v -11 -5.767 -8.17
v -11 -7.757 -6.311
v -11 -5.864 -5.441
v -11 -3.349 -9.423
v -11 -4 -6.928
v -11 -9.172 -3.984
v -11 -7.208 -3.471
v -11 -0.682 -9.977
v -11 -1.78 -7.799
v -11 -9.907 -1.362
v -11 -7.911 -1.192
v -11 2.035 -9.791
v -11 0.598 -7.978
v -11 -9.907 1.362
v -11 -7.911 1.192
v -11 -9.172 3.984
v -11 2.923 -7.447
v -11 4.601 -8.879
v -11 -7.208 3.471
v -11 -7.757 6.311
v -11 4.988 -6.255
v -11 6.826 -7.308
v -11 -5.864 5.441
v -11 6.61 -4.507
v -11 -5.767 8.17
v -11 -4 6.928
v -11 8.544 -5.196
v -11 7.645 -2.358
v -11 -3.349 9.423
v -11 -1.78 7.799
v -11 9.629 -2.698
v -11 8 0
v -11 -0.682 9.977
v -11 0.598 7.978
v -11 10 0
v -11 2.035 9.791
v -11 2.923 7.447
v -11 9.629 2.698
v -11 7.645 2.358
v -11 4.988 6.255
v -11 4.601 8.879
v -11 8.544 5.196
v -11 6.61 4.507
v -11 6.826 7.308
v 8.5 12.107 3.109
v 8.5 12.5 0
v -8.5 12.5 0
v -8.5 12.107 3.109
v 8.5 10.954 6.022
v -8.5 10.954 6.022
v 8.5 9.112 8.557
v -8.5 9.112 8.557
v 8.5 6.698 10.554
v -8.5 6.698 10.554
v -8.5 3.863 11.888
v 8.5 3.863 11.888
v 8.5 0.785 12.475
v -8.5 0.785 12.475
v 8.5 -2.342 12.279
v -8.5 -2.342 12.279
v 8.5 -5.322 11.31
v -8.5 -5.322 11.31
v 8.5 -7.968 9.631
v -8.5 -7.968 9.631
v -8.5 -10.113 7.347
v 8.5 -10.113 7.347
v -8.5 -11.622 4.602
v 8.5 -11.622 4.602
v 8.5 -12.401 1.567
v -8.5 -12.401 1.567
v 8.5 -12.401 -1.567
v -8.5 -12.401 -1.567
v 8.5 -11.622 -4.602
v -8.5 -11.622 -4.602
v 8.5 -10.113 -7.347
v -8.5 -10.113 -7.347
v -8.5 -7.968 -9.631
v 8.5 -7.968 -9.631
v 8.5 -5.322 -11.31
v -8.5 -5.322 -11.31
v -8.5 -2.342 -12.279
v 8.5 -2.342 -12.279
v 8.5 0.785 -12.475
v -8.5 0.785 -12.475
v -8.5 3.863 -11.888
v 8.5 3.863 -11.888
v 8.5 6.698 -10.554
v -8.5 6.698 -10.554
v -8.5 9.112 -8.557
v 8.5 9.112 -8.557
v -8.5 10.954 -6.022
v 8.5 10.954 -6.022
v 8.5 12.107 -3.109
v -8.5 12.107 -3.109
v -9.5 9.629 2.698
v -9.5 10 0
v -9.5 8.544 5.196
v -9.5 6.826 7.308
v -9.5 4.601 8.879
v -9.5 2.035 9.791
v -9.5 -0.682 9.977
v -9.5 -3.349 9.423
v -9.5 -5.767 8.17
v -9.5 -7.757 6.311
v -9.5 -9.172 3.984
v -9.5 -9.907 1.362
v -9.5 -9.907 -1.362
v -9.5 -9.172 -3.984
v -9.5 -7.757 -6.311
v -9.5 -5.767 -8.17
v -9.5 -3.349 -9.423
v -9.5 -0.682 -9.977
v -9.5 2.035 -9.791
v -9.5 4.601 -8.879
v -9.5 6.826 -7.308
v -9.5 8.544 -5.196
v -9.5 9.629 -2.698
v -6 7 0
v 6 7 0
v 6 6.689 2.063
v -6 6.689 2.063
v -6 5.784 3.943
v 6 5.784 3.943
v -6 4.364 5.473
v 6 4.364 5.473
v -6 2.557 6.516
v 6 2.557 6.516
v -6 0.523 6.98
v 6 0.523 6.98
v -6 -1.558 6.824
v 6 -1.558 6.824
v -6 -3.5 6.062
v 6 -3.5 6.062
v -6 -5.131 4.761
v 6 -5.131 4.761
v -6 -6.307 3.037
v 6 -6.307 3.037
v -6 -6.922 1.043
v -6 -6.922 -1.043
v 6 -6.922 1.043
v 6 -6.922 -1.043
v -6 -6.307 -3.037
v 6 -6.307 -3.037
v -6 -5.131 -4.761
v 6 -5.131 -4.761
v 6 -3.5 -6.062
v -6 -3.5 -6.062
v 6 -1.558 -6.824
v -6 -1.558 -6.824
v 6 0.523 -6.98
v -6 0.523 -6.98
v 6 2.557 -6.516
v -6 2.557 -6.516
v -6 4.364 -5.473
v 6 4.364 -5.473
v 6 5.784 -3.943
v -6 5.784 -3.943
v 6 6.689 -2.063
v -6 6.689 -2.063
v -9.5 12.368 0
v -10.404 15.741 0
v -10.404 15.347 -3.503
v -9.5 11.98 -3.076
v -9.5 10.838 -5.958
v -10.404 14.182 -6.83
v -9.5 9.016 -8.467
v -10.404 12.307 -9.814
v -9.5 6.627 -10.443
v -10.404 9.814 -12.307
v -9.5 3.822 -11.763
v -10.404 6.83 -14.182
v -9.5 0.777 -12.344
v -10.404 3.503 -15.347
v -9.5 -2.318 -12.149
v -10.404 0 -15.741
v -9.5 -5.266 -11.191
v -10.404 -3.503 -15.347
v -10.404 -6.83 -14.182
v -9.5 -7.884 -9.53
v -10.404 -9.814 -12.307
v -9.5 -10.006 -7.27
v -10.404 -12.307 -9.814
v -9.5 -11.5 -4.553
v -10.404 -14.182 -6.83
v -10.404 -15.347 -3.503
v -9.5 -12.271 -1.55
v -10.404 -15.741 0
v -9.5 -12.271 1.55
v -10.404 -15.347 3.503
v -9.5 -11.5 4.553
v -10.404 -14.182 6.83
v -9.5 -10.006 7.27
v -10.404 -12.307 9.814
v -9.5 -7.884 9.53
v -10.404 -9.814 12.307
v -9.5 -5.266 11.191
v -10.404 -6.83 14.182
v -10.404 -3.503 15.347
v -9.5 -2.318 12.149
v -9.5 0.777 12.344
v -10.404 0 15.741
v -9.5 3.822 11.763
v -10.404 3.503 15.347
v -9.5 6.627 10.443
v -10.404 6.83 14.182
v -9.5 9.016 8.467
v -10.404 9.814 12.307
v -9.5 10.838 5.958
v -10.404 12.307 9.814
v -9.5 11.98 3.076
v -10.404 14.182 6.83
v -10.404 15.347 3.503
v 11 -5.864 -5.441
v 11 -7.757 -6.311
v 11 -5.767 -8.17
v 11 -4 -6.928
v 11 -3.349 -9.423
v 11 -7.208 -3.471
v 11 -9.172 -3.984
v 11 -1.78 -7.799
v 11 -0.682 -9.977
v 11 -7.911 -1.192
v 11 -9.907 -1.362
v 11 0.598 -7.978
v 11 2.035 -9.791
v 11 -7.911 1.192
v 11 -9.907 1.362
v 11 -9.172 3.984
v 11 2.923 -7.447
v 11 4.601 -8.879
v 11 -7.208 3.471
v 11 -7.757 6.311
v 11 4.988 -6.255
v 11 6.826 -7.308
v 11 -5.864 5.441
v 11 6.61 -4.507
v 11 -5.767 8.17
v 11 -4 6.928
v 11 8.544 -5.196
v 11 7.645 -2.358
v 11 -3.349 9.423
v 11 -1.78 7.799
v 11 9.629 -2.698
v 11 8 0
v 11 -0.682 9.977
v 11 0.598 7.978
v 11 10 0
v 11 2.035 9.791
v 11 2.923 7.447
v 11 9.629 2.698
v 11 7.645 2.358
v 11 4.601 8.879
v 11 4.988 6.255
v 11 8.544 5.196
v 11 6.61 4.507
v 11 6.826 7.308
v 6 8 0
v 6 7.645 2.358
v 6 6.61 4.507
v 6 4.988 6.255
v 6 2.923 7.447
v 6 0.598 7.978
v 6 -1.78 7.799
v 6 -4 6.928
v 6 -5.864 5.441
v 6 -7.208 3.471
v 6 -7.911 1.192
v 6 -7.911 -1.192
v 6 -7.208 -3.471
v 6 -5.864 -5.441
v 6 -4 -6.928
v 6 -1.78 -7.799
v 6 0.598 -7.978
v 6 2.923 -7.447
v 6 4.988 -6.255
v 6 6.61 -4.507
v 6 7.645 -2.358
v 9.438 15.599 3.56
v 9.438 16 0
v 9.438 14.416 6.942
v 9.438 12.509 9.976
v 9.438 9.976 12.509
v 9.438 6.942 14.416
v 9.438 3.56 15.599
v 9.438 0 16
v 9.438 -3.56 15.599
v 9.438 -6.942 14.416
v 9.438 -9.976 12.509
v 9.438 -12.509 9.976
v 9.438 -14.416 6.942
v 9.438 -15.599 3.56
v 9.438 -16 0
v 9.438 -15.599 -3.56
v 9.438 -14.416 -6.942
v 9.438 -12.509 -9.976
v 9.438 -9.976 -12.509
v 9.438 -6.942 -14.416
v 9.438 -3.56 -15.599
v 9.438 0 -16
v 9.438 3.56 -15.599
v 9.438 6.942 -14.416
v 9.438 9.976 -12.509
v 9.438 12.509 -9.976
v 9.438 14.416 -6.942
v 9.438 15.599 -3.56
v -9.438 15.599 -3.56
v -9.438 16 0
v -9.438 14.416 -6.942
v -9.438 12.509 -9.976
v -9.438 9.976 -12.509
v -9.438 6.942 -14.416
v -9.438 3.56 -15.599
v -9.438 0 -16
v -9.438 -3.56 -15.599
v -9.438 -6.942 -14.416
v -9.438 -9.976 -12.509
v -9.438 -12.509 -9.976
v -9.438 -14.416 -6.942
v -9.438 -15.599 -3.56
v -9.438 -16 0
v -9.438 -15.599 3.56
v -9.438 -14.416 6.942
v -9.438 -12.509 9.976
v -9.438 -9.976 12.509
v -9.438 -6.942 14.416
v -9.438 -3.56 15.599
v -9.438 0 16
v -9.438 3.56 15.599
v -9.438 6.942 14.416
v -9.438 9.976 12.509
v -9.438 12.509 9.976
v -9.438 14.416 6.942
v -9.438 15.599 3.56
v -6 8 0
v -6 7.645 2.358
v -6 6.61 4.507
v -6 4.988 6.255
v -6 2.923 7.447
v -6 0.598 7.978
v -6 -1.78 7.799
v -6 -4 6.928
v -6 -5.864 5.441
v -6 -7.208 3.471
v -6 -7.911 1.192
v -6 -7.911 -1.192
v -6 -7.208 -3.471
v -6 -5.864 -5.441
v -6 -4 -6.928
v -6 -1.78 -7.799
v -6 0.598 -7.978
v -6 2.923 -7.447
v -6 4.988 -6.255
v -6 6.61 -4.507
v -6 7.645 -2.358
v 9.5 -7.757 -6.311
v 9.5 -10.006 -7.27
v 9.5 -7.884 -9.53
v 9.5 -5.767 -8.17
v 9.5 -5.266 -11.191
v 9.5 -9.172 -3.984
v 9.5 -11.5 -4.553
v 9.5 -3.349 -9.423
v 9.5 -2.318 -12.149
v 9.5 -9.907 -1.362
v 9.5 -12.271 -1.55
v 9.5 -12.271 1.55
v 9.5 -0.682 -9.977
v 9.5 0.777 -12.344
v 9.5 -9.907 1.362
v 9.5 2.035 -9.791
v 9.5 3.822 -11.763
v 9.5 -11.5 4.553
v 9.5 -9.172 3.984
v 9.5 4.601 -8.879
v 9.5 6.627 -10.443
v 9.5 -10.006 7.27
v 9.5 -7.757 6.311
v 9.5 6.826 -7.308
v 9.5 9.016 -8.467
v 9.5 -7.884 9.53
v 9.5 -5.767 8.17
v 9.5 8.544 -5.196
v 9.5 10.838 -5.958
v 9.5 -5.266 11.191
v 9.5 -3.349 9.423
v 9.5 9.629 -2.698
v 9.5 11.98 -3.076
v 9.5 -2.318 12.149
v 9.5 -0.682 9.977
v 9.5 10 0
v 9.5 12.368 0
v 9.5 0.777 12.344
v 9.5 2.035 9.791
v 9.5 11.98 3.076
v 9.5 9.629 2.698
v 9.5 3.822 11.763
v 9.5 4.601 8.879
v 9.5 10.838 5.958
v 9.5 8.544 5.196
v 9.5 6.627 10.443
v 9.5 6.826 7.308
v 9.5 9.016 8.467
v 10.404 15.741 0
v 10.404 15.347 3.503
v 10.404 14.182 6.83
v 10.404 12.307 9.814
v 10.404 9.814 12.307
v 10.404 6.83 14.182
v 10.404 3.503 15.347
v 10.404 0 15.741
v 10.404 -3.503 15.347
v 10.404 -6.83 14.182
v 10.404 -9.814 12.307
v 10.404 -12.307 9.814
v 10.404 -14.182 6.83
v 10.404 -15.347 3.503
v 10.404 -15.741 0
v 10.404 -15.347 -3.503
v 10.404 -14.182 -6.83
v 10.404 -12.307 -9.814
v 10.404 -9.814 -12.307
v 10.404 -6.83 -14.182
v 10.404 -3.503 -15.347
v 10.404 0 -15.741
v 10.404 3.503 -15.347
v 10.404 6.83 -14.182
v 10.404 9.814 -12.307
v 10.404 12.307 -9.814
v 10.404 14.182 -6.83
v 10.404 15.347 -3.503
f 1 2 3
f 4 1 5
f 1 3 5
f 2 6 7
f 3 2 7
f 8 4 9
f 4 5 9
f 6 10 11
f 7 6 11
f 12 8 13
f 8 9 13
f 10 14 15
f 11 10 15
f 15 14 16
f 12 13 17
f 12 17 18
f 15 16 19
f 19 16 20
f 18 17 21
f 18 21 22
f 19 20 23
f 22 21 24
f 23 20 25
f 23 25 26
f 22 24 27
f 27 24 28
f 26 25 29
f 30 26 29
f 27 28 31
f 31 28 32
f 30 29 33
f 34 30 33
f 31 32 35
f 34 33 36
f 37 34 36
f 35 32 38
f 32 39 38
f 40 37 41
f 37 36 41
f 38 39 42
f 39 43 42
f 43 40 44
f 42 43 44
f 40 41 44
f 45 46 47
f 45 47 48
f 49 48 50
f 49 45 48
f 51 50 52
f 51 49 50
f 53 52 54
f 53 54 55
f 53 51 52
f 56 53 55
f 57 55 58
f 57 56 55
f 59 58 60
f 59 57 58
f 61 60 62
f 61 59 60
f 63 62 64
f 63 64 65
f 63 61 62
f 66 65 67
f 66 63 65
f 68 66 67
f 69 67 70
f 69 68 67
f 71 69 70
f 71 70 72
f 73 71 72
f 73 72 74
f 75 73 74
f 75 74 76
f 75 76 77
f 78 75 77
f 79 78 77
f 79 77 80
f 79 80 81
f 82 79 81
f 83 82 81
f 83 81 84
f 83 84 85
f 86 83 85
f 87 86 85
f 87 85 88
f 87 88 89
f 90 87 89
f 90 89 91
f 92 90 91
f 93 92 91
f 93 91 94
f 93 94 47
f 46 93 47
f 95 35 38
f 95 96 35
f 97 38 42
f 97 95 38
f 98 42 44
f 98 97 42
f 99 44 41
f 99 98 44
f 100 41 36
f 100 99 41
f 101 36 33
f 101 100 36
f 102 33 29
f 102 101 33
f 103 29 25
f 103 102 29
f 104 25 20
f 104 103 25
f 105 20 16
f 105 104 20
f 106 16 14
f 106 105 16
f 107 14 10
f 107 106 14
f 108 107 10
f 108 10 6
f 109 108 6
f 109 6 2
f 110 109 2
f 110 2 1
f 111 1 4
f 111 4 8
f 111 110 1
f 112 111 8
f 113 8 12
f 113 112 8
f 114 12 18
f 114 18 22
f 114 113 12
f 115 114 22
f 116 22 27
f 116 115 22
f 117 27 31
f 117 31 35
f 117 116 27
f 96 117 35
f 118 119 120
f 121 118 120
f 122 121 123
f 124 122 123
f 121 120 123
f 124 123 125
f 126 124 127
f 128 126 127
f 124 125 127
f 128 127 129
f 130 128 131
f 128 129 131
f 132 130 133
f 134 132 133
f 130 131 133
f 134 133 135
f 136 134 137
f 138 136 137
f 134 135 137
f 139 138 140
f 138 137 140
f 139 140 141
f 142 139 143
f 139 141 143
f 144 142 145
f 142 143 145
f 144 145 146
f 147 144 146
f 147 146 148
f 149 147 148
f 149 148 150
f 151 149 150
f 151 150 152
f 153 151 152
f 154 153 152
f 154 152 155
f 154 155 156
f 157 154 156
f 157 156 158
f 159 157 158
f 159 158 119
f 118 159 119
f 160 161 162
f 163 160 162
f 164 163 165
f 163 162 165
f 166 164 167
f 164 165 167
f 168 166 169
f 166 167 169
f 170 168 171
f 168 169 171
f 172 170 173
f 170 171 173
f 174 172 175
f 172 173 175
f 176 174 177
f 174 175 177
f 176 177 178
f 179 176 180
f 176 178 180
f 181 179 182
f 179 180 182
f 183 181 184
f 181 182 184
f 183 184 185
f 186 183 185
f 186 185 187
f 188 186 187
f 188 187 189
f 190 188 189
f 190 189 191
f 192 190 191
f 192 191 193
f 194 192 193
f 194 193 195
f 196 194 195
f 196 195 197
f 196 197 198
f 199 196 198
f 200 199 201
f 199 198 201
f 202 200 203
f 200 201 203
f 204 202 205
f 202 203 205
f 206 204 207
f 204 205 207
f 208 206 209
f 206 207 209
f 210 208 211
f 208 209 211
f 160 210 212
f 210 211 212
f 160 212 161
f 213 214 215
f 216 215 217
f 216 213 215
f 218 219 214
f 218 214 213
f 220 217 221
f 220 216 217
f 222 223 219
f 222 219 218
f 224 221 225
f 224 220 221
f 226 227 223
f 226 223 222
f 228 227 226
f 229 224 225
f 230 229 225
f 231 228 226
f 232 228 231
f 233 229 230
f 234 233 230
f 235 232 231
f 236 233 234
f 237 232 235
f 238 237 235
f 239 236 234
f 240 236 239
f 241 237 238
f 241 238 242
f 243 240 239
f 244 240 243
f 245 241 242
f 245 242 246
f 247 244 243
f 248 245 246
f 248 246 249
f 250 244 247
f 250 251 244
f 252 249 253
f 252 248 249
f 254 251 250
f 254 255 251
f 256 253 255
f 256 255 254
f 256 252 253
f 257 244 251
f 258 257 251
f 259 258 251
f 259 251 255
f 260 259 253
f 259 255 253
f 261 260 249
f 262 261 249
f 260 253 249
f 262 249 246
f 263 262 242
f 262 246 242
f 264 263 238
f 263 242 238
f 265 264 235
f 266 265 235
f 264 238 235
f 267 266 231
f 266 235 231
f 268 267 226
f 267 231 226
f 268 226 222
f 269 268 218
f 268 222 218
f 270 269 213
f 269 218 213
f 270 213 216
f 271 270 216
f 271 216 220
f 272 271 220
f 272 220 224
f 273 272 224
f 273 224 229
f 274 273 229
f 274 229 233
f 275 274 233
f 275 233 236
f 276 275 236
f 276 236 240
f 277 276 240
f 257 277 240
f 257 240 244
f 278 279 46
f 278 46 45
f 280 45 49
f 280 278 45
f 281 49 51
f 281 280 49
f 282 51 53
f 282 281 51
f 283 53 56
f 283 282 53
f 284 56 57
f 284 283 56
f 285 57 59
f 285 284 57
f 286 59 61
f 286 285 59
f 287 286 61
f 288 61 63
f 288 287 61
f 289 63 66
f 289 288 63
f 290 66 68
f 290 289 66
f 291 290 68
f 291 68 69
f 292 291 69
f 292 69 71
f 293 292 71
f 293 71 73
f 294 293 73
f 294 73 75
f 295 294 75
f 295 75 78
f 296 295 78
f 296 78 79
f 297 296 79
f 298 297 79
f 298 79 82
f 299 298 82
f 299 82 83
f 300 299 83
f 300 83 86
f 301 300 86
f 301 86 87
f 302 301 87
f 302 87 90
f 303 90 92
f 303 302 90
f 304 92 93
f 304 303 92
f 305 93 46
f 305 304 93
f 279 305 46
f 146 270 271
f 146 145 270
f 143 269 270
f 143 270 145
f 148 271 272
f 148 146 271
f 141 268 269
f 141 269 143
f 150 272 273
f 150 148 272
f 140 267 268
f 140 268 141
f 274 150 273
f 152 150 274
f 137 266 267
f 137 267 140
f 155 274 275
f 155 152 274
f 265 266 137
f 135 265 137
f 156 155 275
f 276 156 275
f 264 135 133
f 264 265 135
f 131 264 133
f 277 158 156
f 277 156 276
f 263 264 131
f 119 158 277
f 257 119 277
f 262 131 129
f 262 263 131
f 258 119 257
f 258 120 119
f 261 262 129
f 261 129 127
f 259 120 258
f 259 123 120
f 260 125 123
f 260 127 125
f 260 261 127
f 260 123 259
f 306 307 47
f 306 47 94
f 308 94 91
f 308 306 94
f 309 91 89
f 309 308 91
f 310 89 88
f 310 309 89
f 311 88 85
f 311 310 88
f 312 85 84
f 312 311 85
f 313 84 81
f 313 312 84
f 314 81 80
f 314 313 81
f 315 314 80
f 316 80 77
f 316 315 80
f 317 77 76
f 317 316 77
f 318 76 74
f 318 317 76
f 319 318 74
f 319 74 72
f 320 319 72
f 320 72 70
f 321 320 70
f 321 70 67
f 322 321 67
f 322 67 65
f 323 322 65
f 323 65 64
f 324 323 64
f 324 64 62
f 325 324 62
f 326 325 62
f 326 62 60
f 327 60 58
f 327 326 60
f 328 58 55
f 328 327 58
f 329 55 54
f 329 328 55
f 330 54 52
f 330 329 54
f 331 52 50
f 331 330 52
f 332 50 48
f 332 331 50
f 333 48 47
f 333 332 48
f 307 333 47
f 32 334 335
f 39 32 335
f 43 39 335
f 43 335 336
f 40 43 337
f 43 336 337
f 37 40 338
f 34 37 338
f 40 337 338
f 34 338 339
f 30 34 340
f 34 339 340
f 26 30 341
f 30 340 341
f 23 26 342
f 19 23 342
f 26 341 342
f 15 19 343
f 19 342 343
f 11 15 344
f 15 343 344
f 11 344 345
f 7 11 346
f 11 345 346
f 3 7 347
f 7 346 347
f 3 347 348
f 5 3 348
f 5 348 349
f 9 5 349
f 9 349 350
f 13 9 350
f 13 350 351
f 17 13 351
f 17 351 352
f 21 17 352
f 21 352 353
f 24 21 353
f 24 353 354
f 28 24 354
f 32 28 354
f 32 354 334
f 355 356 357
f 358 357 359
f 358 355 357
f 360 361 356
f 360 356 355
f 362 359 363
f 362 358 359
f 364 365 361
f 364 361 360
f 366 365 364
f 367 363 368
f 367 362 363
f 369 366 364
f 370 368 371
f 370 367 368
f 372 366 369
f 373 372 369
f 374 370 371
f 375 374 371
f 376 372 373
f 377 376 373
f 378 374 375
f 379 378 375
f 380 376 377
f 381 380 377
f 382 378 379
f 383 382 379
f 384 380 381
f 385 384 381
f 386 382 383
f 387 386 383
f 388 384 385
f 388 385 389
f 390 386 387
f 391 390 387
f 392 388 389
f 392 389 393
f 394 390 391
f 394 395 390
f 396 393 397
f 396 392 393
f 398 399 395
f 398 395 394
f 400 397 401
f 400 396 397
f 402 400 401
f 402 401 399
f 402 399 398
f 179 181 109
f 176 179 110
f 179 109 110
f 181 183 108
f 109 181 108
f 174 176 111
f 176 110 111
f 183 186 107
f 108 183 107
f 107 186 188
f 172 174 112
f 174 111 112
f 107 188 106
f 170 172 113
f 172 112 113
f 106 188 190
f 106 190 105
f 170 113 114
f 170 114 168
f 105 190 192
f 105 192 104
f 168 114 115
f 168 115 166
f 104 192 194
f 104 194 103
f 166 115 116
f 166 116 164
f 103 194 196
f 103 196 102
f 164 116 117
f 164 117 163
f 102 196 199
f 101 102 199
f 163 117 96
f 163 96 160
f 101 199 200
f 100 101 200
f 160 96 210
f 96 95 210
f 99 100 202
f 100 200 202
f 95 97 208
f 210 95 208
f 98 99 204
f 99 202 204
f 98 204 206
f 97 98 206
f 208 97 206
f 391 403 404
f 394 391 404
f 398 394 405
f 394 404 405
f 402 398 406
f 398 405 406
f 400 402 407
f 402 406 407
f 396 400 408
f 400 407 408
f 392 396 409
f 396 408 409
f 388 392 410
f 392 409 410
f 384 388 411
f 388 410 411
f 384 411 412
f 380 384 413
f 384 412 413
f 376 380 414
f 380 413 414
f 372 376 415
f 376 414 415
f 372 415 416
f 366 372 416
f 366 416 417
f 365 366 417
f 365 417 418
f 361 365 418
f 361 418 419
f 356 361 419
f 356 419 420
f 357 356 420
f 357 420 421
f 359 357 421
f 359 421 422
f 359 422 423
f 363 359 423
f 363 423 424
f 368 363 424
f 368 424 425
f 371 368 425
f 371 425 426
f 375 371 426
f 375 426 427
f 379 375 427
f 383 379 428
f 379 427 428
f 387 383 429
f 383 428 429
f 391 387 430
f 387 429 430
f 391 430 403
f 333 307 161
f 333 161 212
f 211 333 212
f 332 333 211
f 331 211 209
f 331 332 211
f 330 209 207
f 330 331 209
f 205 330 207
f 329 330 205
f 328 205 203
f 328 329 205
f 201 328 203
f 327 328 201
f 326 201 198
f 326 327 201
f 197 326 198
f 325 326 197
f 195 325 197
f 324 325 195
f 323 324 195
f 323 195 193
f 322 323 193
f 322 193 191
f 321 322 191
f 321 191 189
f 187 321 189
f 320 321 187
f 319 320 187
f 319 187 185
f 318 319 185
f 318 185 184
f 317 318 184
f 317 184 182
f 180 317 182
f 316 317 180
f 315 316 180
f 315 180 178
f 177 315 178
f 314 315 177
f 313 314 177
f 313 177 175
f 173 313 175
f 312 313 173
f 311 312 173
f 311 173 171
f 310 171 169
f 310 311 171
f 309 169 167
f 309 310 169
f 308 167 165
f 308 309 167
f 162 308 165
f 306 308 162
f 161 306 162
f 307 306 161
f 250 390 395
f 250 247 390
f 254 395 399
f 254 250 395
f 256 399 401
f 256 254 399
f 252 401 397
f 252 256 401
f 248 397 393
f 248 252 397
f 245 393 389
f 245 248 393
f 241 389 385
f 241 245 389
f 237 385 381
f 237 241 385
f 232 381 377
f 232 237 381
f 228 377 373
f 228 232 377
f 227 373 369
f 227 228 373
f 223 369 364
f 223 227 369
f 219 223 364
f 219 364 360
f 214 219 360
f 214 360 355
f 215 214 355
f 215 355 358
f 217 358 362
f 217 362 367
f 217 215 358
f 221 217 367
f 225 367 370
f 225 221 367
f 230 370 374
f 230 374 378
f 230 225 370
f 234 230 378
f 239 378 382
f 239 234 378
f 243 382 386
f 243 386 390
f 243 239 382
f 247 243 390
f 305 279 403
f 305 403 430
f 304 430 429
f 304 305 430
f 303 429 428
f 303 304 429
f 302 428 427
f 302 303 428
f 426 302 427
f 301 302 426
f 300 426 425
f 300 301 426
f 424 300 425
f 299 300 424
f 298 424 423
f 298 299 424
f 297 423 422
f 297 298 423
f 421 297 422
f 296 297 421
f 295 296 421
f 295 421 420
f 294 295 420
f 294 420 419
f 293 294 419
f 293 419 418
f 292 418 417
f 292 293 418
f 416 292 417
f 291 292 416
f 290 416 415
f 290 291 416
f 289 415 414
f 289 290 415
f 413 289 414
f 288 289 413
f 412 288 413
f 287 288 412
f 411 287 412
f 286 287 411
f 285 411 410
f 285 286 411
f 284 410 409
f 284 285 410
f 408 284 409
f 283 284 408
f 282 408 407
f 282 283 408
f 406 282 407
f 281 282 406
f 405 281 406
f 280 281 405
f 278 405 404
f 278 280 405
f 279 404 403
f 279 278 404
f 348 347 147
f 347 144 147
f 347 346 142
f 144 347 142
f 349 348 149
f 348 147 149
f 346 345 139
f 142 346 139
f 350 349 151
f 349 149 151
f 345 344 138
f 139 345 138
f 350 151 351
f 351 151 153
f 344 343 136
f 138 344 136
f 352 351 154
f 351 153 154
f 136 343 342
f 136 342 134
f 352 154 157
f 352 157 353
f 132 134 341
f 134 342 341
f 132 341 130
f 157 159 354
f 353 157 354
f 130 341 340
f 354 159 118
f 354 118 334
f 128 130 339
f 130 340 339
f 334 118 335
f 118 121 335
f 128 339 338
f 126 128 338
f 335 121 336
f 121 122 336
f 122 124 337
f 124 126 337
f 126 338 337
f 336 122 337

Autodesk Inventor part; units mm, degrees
sketch "_____2" plane through (0, 0, 0) normal (0, 0, 1) x (1, 0, 0)
  line L0 (11, 0) -> (-11, 0)
  line L1 (-11, 0) -> (-11, 10)
  line L2 (-11, 10) -> (-9.5, 10)
  line L3 (-9.5, 10) -> (-9.5, 12.3683)
  line L4 (-9.5, 12.3683) -> (-10.4037, 15.7412)
  line L5 (-10.4037, 15.7412) -> (-9.4378, 16)
  line L6 (-9.4378, 16) -> (-8.5, 12.5)
  line L7 (-8.5, 12.5) -> (8.5, 12.5)
  line L8 (8.5, 12.5) -> (9.4378, 16)
  line L9 (9.4378, 16) -> (10.4037, 15.7412)
  line L10 (10.4037, 15.7412) -> (9.5, 12.3683)
  line L11 (9.5, 12.3683) -> (9.5, 10)
  line L12 (9.5, 10) -> (11, 10)
  line L13 (11, 10) -> (11, 0)
  line L14 (11, 0) -> (-11, 0)
revolve "Revolution1" add sketch "_____2" angle 360 about axis through (11, 0, 0) along (1, 0, 0)
sketch "_____3" plane through (0, 0, 0) normal (0, 0, 1) x (1, 0, 0)
  line L0 (11, 0) -> (-11, 0)
  line L1 (-11, 0) -> (-11, 8)
  line L2 (-11, 8) -> (-6, 8)
  line L3 (-6, 8) -> (-6, 7)
  line L4 (-6, 7) -> (6, 7)
  line L5 (6, 7) -> (6, 8)
  line L6 (6, 8) -> (11, 8)
  line L7 (11, 8) -> (11, 0)
  line L8 (11, 0) -> (-11, 0)
revolve "Revolution2" cut sketch "_____3" angle 360 about axis through (11, 0, 0) along (1, 0, 0)
ref_plane "b600_1_XY" through (8.5, 0, 0) normal (1, 0, 0) x (0, 0, -1)
ref_plane "b600_1_YZ" through (8.5, 0, 0) normal (0, 0, -1) x (0, 1, 0)
ref_plane "b600_1_ZX" through (8.5, 0, 0) normal (0, 1, 0) x (1, 0, 0)
ref_plane "b600_2_XY" through (-8.5, 0, 0) normal (1, 0, 0) x (0, 0, -1)
ref_plane "b600_2_YZ" through (-8.5, 0, 0) normal (0, 0, -1) x (0, 1, 0)
ref_plane "b600_2_ZX" through (-8.5, 0, 0) normal (0, 1, 0) x (1, 0, 0)
ref_plane "to_dummy_XY" through (0, 0, 0) normal (1, 0, 0) x (0, 0, -1)
ref_plane "to_dummy_YZ" through (0, 0, 0) normal (0, 0, -1) x (0, 1, 0)
ref_plane "to_dummy_ZX" through (0, 0, 0) normal (0, 1, 0) x (1, 0, 0)
properties part number "C-AFDF22-25_bw"
